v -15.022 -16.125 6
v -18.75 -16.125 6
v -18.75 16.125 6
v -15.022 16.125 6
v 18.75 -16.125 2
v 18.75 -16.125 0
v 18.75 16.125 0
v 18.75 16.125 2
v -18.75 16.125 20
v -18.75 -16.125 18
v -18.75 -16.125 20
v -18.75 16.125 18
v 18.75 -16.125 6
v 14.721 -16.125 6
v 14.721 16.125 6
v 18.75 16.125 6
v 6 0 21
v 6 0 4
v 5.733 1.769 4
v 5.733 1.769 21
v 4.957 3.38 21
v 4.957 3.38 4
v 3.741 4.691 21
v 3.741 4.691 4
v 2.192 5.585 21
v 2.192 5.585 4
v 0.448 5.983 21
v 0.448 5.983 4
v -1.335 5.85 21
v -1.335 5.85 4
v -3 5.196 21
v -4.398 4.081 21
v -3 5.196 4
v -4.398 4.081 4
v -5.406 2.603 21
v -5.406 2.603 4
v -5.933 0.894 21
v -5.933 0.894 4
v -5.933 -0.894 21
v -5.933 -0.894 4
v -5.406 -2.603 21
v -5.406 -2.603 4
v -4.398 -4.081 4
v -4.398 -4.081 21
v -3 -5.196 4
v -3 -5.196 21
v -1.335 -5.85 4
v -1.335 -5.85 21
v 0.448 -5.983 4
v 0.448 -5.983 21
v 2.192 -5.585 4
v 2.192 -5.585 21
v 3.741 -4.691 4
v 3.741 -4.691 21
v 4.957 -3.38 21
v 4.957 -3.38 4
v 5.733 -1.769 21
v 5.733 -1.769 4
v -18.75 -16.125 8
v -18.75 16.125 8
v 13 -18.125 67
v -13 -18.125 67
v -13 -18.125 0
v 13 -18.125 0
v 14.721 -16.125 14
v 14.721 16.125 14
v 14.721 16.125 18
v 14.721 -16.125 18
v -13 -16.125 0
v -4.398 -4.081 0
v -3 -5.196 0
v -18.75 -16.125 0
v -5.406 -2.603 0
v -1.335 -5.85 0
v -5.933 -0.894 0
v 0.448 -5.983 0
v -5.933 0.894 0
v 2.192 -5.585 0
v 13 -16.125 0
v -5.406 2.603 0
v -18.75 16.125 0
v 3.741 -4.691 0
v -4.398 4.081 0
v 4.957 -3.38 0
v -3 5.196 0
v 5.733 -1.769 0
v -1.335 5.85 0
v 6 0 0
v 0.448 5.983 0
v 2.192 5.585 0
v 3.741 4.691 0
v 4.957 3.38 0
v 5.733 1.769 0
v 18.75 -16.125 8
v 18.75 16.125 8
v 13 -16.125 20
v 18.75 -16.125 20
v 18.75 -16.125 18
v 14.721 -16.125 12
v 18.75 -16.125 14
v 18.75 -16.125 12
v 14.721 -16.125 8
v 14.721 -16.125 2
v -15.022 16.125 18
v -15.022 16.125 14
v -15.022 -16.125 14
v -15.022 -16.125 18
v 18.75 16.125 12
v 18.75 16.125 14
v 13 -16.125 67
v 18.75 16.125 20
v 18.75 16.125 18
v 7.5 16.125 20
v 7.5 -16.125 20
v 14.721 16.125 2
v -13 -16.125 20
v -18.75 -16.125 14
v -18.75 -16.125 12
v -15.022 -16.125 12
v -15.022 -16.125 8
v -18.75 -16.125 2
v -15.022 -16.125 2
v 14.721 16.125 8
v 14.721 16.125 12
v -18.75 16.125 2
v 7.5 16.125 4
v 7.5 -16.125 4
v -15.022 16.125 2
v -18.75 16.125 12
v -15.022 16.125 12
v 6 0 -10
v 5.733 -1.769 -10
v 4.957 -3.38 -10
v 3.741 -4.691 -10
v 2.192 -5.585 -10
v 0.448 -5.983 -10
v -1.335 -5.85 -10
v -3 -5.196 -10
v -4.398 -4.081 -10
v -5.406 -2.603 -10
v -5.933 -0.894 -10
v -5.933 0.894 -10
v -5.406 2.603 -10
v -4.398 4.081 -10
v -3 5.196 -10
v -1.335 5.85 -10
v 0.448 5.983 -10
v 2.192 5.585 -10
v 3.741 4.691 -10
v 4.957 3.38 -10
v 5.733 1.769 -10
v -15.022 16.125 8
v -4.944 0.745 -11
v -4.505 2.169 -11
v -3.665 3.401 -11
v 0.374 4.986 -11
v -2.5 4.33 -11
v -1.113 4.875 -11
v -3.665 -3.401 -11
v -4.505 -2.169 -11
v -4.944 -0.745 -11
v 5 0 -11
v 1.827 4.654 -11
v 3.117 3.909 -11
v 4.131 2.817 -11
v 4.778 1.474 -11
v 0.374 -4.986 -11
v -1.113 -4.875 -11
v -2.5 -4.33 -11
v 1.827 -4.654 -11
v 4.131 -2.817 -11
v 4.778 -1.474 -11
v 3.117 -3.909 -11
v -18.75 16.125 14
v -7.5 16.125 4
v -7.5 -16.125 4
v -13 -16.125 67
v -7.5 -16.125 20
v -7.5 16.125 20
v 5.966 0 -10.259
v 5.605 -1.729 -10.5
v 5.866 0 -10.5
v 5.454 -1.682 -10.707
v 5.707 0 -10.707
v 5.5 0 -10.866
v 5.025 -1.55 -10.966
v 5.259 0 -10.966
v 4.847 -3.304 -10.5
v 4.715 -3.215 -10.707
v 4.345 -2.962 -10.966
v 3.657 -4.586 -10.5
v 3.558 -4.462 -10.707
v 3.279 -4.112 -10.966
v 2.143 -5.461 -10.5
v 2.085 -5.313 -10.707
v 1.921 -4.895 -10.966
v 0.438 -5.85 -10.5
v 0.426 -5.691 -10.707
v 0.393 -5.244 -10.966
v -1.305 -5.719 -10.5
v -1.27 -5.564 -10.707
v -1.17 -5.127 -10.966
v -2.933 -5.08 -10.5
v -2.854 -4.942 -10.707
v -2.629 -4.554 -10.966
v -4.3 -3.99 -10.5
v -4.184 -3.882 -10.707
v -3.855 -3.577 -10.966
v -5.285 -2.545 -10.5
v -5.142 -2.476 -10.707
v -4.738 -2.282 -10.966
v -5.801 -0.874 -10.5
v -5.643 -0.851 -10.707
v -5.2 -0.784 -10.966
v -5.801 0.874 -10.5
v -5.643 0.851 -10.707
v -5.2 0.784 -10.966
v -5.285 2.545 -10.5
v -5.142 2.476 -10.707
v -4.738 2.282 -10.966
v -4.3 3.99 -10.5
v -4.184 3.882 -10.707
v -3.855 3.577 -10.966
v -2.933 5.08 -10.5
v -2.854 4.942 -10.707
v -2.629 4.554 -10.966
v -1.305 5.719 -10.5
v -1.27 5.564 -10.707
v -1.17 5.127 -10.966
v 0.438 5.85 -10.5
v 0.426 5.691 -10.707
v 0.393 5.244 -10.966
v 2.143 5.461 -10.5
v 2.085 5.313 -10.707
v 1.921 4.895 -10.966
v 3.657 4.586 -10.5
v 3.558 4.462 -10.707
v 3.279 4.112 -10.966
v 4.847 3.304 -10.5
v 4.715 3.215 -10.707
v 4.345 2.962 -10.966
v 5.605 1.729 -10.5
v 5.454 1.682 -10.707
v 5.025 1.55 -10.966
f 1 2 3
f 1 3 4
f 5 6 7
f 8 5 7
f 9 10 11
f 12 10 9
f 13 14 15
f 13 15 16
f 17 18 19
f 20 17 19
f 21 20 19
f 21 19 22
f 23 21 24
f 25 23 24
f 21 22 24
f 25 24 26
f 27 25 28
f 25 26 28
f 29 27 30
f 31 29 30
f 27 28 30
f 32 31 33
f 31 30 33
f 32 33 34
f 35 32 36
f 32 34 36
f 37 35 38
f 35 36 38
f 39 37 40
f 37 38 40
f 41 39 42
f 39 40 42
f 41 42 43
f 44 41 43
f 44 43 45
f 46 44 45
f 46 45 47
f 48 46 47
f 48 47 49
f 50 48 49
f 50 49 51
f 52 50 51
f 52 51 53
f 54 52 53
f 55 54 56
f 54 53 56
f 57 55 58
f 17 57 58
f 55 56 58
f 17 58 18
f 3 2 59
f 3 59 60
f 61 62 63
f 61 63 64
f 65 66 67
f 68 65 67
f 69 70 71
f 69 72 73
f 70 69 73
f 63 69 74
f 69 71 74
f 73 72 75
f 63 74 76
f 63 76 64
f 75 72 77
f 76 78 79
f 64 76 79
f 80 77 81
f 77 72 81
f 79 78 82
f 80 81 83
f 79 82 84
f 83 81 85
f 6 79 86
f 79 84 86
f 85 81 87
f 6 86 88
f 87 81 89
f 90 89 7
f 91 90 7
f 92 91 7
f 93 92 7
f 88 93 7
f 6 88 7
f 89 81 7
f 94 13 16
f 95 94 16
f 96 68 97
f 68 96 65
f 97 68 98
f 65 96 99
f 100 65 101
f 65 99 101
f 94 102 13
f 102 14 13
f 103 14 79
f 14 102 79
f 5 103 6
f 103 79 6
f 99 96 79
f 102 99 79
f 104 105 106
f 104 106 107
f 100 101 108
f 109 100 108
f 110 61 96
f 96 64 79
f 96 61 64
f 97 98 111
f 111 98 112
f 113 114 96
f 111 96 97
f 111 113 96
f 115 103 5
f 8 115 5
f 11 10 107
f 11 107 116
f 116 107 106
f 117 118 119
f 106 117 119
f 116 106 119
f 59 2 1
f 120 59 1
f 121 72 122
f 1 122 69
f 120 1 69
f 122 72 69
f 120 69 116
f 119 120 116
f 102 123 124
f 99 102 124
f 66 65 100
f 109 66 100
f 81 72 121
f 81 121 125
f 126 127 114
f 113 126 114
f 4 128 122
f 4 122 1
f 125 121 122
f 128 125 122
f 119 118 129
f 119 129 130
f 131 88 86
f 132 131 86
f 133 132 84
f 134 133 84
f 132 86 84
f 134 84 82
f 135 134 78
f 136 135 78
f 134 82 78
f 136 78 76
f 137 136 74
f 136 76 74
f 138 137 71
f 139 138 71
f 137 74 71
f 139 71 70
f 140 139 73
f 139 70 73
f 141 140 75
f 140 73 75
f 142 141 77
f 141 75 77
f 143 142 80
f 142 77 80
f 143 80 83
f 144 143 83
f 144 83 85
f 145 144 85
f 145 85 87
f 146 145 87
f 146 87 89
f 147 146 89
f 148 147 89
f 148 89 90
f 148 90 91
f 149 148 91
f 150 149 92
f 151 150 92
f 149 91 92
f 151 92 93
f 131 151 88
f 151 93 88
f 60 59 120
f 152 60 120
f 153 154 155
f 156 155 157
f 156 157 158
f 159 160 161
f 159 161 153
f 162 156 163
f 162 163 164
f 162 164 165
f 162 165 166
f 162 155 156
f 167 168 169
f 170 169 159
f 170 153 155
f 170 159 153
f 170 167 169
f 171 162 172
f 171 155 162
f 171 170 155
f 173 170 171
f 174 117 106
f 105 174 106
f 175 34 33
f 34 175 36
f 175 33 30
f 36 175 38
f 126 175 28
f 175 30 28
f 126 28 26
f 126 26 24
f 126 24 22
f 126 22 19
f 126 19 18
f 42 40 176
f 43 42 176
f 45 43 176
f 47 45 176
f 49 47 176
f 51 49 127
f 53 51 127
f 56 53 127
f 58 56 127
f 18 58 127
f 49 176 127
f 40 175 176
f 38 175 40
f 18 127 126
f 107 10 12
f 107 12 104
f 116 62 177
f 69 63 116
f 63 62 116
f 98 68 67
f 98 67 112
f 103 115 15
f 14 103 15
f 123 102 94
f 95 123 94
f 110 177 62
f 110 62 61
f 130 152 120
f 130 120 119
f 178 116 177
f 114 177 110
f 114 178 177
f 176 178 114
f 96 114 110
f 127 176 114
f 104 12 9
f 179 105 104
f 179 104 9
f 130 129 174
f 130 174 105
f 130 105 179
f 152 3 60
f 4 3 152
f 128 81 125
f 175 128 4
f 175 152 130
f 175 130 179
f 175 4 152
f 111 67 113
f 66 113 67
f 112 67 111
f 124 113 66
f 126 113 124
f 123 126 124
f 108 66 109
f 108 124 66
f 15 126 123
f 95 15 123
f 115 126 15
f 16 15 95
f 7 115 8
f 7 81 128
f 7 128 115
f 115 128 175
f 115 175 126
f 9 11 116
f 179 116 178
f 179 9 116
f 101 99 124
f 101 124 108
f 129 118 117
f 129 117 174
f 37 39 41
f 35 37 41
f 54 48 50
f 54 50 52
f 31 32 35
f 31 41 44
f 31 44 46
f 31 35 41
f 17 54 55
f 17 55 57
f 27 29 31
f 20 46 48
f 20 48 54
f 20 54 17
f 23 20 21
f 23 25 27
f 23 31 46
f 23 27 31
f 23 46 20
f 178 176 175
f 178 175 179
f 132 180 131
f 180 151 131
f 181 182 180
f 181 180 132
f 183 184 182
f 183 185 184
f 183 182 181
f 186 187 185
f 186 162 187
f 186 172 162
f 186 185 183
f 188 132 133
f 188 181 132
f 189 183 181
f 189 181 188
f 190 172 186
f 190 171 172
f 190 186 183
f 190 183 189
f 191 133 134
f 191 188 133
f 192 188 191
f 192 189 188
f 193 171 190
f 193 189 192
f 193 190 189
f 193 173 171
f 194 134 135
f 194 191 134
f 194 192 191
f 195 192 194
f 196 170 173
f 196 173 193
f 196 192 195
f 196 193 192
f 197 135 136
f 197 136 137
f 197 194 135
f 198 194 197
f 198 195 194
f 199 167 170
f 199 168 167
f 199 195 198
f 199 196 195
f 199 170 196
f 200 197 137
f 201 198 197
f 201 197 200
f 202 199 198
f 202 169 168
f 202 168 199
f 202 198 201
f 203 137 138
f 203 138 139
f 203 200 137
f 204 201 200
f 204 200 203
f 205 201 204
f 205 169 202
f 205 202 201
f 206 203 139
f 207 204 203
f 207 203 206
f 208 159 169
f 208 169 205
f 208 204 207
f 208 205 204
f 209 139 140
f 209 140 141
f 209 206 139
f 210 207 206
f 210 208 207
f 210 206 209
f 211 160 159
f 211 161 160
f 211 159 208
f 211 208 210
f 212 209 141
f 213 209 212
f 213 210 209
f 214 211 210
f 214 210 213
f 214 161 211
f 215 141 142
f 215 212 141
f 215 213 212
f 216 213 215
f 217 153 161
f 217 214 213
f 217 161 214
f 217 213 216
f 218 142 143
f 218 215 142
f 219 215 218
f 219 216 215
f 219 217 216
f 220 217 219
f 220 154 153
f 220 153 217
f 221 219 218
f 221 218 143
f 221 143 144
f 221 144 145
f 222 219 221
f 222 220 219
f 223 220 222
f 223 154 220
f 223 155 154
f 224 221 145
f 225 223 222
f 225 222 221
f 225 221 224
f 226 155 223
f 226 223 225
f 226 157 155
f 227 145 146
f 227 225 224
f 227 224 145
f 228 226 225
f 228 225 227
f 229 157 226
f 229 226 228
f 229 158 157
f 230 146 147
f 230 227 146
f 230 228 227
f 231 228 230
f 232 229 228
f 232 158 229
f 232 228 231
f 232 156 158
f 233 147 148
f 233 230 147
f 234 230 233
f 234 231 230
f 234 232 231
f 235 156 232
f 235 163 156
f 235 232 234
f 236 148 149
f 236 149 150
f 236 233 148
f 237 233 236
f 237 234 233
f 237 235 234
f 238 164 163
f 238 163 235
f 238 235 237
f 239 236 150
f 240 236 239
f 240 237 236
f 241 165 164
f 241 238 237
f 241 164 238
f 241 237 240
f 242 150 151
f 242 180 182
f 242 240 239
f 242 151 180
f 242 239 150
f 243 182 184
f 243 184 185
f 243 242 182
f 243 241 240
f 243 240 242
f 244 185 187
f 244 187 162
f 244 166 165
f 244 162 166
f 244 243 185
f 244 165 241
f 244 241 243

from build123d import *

# Parameters (mm, degrees)
F0_W      = 37.5
F0_H      = 32.25
F1_DEPTH  = 20
F2_R      = 6
F3_DEPTH  = 11
F4_W      = 15
F4_H      = 16
F4_W_2    = 3.7276374176
F4_H_2    = 4
F4_W_3    = 4.0285747498
F5_DEPTH  = 32.251
F6_R      = 1
F7_R      = 6
F8_DEPTH  = 17
F9_W      = 26
F9_H      = 2
F10_DEPTH = 67


with BuildPart() as f1:
    # F0 (on Top) → F1 (new body)
    with BuildSketch(Plane.XY):
        Rectangle(F0_W, F0_H)
    extrude(amount=F1_DEPTH)

    # F2 (on face) → F3 (join)
    with BuildSketch(Plane(origin=(0, 0, 0), x_dir=(1, 0, 0), z_dir=(0, 0, -1))):
        Circle(F2_R)
    extrude(amount=F3_DEPTH)

    # F4 (on face) → F5 (cut, through all)
    with BuildSketch(Plane.XZ.offset(16.125)):
        with Locations((0, 12)):
            Rectangle(F4_W, F4_H)
        with Locations((-16.8861812912, 16)):
            Rectangle(F4_W_2, F4_H_2)
        with Locations((-16.8861812912, 4)):
            Rectangle(F4_W_2, F4_H_2)
        with Locations((16.7357126251, 16)):
            Rectangle(F4_W_3, F4_H_2)
        with Locations((16.7357126251, 10)):
            Rectangle(F4_W_3, F4_H_2)
        with Locations((16.7357126251, 4)):
            Rectangle(F4_W_3, F4_H_2)
        with Locations((-16.8861812912, 10)):
            Rectangle(F4_W_2, F4_H_2)
    extrude(amount=-F5_DEPTH, mode=Mode.SUBTRACT)

    # F6
    f6_edges = [f1.edges().sort_by_distance(p)[0] for p in [
        (-6, 0, -11),
    ]]
    fillet(f6_edges, radius=F6_R)

    # F7 (on face) → F8 (join)
    with BuildSketch(Plane.XY.offset(4)):
        Circle(F7_R)
    extrude(amount=F8_DEPTH)

    # F9 (on Top) → F10 (join)
    with BuildSketch(Plane.XY):
        with Locations((0, -17.125)):
            Rectangle(F9_W, F9_H)
    extrude(amount=F10_DEPTH)


solid = f1.part
